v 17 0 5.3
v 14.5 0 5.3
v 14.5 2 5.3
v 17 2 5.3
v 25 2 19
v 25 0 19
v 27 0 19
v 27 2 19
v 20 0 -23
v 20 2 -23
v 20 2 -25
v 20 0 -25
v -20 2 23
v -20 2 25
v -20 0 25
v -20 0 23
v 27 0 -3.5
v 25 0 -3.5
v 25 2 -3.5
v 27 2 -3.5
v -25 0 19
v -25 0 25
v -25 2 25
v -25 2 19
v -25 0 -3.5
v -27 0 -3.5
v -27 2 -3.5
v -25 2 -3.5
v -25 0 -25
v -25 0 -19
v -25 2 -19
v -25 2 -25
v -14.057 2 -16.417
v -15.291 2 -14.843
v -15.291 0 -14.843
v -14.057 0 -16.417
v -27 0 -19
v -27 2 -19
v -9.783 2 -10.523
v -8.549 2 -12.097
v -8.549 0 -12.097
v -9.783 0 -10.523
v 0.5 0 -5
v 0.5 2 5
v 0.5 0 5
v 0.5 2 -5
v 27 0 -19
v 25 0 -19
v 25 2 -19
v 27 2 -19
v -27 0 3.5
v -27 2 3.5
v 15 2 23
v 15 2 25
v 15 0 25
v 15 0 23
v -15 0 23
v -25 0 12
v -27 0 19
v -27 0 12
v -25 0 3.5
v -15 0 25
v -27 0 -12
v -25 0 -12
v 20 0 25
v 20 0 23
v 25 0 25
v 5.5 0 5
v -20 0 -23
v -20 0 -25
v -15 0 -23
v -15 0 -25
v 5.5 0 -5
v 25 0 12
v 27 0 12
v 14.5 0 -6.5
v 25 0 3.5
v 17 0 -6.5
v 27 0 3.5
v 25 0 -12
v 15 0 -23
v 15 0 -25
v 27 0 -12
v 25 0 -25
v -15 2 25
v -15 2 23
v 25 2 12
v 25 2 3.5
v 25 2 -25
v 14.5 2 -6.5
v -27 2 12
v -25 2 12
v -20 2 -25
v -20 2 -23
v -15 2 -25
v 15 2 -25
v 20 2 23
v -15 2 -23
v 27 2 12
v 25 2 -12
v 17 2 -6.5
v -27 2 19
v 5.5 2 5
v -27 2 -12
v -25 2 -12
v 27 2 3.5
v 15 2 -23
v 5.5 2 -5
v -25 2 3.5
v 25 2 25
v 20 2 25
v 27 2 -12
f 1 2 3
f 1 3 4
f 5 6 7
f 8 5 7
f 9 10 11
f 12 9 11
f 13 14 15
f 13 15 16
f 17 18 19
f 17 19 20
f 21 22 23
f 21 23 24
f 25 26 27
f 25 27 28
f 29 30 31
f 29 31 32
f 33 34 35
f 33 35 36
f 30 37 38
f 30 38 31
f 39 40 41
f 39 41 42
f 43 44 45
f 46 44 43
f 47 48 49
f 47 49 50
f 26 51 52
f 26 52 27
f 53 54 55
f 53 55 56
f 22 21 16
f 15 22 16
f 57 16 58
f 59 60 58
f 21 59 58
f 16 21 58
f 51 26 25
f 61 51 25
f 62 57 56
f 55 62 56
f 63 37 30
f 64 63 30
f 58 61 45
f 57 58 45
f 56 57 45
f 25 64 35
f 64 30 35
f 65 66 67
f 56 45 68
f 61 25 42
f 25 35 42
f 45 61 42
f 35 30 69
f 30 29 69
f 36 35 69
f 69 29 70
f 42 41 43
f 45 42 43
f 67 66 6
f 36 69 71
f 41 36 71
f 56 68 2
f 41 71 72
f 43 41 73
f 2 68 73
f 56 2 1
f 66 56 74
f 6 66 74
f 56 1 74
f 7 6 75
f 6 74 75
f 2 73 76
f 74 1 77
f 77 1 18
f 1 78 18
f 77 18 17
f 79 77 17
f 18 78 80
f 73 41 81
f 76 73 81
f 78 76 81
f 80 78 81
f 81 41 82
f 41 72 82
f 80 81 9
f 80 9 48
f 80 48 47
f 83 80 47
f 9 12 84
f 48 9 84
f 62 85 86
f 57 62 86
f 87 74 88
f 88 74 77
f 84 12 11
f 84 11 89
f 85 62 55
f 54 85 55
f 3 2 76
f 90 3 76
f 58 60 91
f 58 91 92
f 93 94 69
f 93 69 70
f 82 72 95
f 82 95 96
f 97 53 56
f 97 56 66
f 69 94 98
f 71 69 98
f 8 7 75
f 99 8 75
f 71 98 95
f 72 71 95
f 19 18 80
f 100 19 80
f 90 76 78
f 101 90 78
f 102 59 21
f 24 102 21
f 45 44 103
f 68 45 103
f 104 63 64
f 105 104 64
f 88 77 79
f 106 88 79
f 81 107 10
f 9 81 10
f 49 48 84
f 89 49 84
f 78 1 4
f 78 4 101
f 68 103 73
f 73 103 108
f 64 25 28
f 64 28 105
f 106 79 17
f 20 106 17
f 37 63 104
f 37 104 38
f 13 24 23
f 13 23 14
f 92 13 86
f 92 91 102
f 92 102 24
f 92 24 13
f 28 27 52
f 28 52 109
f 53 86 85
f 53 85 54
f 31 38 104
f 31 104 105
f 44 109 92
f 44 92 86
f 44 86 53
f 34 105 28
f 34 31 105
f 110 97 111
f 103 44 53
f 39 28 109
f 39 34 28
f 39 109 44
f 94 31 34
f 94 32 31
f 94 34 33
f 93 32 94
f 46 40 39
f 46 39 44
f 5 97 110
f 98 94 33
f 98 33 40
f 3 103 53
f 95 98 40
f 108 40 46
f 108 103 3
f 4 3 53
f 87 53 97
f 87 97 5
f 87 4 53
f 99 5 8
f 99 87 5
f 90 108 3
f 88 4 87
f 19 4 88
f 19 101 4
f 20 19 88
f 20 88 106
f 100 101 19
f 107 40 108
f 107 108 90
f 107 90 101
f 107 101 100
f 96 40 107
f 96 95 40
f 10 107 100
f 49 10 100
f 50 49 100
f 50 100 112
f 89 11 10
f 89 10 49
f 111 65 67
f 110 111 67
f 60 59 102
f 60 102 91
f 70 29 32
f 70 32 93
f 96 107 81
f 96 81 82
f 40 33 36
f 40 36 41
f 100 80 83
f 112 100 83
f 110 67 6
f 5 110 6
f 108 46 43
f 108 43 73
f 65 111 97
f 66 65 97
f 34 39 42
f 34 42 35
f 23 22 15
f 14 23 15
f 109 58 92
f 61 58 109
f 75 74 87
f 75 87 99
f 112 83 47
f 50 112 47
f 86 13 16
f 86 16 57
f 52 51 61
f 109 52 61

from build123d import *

# Parameters (mm, degrees)
SKETCH1_W           = 50
SKETCH1_H           = 50
SKETCH1_W_2         = 2.5
SKETCH1_H_2         = 11.8
SKETCH1_W_3         = 2
SKETCH1_H_3         = 7
BOSS_EXTRUDE1_DEPTH = 2
SKETCH3_W           = 5
SKETCH3_H           = 2
CUT_EXTRUDE1_DEPTH  = 2
SKETCH4_W           = 5
SKETCH4_H           = 10
CUT_EXTRUDE2_DEPTH  = 2
CUT_EXTRUDE3_DEPTH  = 2


with BuildPart() as part:
    # Sketch1 → Boss-Extrude1 (new body)
    # profile 1 of 7: a face of its own
    with BuildSketch(Plane(origin=(0, 0, 0), x_dir=(1, 0, 0), z_dir=(0, 1, 0))):
        Rectangle(SKETCH1_W, SKETCH1_H)
        with Locations((15.75, 0.6)):
            Rectangle(SKETCH1_W_2, SKETCH1_H_2, mode=Mode.SUBTRACT)
    # profile 2 of 7: a face of its own
    with BuildSketch(Plane(origin=(0, 0, 0), x_dir=(1, 0, 0), z_dir=(0, 1, 0))):
        with Locations((26, 0)):
            Rectangle(SKETCH1_W_3, SKETCH1_H_3)
    # profile 3 of 7: a face of its own
    with BuildSketch(Plane(origin=(0, 0, 0), x_dir=(1, 0, 0), z_dir=(0, 1, 0))):
        with Locations((26, 15.5)):
            Rectangle(SKETCH1_W_3, SKETCH1_H_3)
    # profile 4 of 7: a face of its own
    with BuildSketch(Plane(origin=(0, 0, 0), x_dir=(1, 0, 0), z_dir=(0, 1, 0))):
        with Locations((26, -15.5)):
            Rectangle(SKETCH1_W_3, SKETCH1_H_3)
    # profile 5 of 7: a face of its own
    with BuildSketch(Plane(origin=(0, 0, 0), x_dir=(1, 0, 0), z_dir=(0, 1, 0))):
        with Locations((-26, 0)):
            Rectangle(SKETCH1_W_3, SKETCH1_H_3)
    # profile 6 of 7: a face of its own
    with BuildSketch(Plane(origin=(0, 0, 0), x_dir=(1, 0, 0), z_dir=(0, 1, 0))):
        with Locations((-26, -15.5)):
            Rectangle(SKETCH1_W_3, SKETCH1_H_3)
    # profile 7 of 7: a face of its own
    with BuildSketch(Plane(origin=(0, 0, 0), x_dir=(1, 0, 0), z_dir=(0, 1, 0))):
        with Locations((-26, 15.5)):
            Rectangle(SKETCH1_W_3, SKETCH1_H_3)
    extrude(amount=BOSS_EXTRUDE1_DEPTH)

    # Sketch3 → Cut-Extrude1 (cut)
    with BuildSketch(Plane(origin=(0, 2, 0), x_dir=(1, 0, 0), z_dir=(0, 1, 0))):
        with Locations((17.5, 24)):
            Rectangle(SKETCH3_W, SKETCH3_H)
        with Locations((17.5, -24)):
            Rectangle(SKETCH3_W, SKETCH3_H)
        with Locations((-17.5, 24)):
            Rectangle(SKETCH3_W, SKETCH3_H)
        with Locations((-17.5, -24)):
            Rectangle(SKETCH3_W, SKETCH3_H)
    extrude(amount=-CUT_EXTRUDE1_DEPTH, mode=Mode.SUBTRACT)

    # Sketch4 → Cut-Extrude2 (cut)
    with BuildSketch(Plane(origin=(0, 2, 0), x_dir=(1, 0, 0), z_dir=(0, 1, 0))):
        with Locations((3, 0)):
            Rectangle(SKETCH4_W, SKETCH4_H)
    extrude(amount=-CUT_EXTRUDE2_DEPTH, mode=Mode.SUBTRACT)

    # Sketch5 → Cut-Extrude3 (cut)
    with BuildSketch(Plane(origin=(0, 2, 0), x_dir=(1, 0, 0), z_dir=(0, 1, 0))):
        Polygon((-14.056788221, 16.417088801), (-8.5488143, 12.097109255), (-9.78309417, 10.52340242), (-15.291068091, 14.843381966), align=None)
    extrude(amount=-CUT_EXTRUDE3_DEPTH, mode=Mode.SUBTRACT)


solid = part.part
